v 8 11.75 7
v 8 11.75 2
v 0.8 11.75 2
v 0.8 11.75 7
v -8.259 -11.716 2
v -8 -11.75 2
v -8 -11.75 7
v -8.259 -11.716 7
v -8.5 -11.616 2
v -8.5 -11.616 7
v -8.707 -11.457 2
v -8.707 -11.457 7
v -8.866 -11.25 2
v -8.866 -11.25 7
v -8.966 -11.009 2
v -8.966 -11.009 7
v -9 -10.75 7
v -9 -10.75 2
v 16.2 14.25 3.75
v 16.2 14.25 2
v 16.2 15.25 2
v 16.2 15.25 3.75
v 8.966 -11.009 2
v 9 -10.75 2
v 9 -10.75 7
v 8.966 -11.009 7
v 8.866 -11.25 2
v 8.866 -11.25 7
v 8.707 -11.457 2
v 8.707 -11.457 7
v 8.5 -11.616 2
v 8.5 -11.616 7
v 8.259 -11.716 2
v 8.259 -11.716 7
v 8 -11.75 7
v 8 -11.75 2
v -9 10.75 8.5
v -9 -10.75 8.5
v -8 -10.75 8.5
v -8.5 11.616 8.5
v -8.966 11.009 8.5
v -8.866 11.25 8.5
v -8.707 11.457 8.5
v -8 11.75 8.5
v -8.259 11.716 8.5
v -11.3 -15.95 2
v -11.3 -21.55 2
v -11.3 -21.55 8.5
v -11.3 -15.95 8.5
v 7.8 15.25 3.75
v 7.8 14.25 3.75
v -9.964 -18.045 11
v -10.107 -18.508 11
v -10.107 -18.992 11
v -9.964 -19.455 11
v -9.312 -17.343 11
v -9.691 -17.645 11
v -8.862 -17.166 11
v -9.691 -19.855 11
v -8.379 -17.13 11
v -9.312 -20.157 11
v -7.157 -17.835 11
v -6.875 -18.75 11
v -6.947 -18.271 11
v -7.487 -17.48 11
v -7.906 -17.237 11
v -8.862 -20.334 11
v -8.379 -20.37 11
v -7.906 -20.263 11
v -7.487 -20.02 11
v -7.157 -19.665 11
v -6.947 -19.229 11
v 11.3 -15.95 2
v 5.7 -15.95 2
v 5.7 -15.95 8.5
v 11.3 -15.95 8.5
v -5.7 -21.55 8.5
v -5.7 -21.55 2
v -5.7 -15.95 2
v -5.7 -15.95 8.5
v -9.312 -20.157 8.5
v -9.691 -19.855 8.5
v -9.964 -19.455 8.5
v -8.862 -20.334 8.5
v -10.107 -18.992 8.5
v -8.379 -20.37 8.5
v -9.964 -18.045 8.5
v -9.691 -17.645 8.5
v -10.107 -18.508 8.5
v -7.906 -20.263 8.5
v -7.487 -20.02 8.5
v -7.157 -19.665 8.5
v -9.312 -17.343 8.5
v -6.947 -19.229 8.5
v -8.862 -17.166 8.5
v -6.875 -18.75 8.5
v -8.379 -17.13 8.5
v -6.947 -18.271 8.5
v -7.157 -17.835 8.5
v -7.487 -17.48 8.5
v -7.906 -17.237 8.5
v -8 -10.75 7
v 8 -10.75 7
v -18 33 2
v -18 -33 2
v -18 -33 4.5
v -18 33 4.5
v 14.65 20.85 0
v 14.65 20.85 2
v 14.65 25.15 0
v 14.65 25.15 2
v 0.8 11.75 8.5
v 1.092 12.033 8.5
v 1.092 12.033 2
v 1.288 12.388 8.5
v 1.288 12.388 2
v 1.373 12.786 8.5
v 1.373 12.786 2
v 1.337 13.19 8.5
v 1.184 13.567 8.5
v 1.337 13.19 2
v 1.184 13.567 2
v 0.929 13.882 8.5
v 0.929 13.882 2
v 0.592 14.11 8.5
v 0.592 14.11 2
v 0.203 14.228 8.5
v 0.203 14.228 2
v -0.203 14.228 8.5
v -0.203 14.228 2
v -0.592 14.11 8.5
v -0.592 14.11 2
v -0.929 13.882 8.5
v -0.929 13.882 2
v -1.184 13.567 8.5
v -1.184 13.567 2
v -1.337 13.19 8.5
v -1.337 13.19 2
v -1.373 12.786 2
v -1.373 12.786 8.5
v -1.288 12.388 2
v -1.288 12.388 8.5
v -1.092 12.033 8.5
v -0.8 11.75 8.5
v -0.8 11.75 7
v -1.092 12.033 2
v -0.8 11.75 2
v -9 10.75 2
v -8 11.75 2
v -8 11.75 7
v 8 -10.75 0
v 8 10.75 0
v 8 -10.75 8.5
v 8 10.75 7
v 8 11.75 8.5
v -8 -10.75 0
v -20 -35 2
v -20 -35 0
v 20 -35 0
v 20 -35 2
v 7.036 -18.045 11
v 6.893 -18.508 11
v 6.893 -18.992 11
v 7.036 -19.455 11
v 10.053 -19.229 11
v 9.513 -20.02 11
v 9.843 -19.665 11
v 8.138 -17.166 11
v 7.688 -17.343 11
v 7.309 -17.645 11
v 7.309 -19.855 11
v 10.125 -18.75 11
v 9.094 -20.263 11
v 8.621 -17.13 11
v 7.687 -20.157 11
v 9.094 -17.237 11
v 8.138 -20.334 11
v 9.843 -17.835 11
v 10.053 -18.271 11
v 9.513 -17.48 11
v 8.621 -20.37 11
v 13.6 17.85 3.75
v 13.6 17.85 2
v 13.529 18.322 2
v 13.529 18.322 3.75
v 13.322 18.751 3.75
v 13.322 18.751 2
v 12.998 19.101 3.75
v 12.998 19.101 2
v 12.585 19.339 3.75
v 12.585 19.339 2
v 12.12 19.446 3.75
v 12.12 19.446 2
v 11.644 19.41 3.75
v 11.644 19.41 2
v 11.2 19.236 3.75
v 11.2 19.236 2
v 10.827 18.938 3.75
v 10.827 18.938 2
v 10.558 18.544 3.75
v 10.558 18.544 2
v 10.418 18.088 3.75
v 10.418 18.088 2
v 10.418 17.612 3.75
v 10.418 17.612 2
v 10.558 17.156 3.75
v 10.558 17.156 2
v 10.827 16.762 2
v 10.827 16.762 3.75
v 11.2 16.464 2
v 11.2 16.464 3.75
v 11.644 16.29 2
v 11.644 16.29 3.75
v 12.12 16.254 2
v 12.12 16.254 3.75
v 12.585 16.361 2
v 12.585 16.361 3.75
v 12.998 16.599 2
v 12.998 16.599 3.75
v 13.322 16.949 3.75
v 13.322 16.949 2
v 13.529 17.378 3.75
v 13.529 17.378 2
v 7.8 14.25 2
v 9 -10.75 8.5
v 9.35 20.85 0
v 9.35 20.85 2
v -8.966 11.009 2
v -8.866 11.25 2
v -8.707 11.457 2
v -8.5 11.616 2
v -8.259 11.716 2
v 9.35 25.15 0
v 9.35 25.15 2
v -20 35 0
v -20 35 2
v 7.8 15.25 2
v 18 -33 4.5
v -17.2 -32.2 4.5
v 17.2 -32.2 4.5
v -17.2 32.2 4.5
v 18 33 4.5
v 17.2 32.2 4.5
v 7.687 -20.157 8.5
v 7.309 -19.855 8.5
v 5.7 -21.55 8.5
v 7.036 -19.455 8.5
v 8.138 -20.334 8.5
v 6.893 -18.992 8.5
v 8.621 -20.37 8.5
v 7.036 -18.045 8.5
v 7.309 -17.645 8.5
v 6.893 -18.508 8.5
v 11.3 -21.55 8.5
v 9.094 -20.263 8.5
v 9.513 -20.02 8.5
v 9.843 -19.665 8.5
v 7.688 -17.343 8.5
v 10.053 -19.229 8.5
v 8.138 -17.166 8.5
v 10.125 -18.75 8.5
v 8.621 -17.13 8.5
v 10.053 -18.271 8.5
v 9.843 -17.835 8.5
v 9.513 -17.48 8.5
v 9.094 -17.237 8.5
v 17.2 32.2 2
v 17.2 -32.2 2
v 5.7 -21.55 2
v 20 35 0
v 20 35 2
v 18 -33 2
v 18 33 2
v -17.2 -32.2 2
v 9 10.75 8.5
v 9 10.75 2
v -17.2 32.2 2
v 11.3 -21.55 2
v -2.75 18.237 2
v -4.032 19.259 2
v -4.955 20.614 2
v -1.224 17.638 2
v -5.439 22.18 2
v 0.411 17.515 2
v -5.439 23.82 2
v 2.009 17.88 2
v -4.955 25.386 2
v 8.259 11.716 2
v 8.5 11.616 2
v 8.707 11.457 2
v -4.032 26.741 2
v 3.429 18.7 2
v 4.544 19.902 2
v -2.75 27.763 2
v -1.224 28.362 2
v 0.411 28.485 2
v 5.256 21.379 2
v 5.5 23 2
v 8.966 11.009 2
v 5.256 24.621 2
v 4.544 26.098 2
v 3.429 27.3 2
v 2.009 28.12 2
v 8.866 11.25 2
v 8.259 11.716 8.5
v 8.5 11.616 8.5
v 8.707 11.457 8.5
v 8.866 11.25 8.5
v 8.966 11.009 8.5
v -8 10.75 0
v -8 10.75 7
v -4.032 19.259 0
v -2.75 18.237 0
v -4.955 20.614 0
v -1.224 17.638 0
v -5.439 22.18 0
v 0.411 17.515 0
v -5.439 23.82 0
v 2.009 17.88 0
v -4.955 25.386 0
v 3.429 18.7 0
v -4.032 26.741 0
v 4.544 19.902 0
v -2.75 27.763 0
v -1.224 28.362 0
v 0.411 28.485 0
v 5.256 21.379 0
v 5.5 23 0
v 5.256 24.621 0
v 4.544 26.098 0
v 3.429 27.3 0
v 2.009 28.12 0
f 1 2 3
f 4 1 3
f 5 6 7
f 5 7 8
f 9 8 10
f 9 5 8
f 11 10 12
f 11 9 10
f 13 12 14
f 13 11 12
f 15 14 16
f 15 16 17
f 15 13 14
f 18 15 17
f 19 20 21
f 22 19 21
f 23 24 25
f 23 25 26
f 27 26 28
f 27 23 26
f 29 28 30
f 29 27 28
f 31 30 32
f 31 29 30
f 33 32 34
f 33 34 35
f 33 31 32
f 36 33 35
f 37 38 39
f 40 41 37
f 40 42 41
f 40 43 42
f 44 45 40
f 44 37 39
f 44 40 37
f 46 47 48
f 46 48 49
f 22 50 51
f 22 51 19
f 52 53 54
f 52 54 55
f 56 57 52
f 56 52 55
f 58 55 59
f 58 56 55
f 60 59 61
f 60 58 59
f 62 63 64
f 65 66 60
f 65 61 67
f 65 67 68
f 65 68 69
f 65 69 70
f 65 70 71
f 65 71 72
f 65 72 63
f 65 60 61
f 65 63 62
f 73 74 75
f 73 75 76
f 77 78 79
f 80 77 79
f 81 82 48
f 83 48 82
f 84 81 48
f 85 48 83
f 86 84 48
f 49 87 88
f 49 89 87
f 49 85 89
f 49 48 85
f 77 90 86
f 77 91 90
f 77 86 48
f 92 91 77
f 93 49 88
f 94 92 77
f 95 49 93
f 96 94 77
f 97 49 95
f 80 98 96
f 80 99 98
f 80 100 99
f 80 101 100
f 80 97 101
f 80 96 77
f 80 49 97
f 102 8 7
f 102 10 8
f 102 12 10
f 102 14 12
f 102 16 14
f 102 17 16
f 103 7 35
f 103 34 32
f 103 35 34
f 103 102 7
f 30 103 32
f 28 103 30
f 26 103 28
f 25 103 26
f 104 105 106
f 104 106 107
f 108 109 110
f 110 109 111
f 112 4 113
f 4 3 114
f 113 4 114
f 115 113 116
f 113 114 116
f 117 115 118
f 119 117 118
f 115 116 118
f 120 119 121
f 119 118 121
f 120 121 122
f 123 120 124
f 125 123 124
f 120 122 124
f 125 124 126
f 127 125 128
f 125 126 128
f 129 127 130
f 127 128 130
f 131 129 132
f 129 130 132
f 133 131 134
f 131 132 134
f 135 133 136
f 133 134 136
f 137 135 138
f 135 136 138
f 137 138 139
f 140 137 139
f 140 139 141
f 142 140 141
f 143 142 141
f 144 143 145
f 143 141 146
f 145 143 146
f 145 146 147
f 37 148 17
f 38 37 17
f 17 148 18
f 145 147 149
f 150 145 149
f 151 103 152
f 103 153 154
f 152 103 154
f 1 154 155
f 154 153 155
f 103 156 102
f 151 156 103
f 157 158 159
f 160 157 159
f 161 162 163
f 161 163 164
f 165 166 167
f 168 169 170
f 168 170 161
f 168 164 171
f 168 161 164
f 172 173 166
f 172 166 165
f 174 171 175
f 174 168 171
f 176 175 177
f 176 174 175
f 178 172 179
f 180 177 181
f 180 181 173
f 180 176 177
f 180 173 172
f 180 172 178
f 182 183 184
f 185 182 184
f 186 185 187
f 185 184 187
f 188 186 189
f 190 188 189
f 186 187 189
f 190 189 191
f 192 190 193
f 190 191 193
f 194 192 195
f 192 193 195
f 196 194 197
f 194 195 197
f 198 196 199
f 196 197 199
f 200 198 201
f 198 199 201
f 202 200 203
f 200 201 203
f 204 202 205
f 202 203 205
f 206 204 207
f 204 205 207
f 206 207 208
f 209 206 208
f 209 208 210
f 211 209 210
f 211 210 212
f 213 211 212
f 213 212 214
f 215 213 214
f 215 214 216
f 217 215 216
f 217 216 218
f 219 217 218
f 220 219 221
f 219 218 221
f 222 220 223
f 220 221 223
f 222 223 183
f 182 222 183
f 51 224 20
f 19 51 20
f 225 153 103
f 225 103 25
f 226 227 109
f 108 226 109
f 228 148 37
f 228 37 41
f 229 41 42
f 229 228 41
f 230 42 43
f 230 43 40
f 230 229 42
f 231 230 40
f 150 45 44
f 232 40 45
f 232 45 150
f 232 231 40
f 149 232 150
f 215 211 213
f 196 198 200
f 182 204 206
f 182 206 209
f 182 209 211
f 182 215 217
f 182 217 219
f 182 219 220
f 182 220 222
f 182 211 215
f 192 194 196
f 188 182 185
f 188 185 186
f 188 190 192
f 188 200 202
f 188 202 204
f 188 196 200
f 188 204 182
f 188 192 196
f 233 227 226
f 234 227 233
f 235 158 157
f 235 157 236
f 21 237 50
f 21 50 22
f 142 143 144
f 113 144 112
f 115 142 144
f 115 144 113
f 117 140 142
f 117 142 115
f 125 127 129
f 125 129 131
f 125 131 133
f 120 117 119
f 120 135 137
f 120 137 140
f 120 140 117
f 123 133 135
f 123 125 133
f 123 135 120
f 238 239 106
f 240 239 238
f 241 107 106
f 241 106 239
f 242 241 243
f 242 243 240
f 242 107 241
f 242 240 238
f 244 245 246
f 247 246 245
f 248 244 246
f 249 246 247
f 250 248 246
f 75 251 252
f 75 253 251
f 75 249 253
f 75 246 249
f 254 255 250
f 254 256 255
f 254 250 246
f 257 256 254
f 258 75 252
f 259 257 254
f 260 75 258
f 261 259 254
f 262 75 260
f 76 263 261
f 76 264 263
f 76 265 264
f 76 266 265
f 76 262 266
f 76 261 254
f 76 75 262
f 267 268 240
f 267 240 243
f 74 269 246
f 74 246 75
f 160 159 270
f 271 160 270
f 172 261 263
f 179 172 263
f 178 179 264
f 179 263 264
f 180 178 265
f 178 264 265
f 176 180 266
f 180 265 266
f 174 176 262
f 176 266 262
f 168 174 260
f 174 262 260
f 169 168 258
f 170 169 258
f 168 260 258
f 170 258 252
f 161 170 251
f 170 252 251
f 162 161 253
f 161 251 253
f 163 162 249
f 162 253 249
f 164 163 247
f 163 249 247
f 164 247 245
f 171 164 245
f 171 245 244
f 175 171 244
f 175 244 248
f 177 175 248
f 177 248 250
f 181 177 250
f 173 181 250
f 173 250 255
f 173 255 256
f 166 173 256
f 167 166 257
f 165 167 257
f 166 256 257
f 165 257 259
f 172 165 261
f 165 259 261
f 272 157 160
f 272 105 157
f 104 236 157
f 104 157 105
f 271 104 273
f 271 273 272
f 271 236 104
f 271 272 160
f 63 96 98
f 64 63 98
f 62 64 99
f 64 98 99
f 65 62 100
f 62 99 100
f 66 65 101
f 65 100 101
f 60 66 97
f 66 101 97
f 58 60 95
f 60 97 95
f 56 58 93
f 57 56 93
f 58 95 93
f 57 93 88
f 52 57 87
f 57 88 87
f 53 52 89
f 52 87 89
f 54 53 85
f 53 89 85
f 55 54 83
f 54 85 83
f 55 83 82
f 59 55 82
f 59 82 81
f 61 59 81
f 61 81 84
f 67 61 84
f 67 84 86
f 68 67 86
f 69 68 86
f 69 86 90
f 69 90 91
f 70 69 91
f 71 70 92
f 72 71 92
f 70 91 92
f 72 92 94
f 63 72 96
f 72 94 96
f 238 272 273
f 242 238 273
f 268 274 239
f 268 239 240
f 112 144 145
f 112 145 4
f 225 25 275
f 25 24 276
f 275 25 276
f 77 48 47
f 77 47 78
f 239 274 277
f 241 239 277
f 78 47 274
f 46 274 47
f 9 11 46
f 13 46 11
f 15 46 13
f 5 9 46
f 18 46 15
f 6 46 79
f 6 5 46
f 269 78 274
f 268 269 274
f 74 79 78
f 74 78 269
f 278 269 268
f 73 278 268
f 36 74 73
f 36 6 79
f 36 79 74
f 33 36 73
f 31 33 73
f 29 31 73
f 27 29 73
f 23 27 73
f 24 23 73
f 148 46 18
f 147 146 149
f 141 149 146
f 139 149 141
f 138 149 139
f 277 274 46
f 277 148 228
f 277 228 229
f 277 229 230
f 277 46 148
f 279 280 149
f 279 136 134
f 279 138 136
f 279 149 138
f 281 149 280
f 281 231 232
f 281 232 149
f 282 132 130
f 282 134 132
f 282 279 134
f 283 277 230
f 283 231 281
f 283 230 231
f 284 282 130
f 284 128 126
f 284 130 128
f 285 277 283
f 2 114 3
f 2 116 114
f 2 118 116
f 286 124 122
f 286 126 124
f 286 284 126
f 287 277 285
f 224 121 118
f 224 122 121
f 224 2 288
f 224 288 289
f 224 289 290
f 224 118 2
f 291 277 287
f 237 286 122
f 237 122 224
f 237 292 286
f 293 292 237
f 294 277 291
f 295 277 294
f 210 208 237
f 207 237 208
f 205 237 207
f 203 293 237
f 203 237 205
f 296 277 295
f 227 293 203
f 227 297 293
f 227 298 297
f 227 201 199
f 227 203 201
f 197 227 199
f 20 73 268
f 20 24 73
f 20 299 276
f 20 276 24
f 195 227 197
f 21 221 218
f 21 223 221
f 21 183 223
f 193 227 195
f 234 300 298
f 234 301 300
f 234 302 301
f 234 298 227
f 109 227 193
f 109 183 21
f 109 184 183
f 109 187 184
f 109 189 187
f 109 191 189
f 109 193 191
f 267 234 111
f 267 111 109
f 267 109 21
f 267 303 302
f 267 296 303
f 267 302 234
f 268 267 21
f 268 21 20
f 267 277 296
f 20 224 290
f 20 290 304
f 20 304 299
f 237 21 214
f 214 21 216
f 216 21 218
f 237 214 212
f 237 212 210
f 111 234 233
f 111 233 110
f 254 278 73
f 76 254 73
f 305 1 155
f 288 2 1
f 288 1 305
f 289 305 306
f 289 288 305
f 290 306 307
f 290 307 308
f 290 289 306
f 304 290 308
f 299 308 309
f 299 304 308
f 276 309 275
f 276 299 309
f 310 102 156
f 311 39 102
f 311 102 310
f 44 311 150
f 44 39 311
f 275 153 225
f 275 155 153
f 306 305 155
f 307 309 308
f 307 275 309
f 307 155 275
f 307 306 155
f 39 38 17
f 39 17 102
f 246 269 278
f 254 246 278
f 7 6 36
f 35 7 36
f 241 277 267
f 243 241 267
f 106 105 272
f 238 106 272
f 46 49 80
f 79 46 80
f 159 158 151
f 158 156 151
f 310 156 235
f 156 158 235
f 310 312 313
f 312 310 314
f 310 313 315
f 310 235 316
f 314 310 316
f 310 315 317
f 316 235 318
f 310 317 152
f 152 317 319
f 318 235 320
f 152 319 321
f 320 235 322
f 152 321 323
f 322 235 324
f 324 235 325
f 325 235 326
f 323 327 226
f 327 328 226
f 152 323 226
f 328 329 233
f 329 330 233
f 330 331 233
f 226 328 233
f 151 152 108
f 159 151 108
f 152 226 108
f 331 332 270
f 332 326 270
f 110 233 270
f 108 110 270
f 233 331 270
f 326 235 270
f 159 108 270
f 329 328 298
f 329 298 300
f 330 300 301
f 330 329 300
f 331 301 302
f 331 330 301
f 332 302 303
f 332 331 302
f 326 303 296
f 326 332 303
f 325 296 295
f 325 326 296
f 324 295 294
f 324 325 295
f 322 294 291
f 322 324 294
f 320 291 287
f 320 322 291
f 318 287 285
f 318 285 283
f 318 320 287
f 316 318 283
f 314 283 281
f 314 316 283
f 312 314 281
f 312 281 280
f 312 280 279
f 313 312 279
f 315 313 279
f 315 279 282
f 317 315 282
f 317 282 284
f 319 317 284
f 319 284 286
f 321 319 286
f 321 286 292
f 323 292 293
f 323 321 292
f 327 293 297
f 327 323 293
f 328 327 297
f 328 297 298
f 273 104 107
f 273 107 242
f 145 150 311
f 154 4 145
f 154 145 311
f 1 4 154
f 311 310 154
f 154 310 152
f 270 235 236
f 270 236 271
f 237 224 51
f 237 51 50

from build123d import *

# Parameters (mm, degrees)
SKETCH_W        = 40
SKETCH_H        = 70
SKETCH_R        = 5.5
SKETCH_W_2      = 16
SKETCH_H_2      = 21.5
PAD_DEPTH       = 2
SKETCH001_W     = 5.6
SKETCH001_H     = 5.6
SKETCH001_W_2   = 16
SKETCH001_H_2   = 21.5
PAD001_DEPTH    = 6.5
SKETCH002_R     = 1.625
PAD002_DEPTH    = 2.5
SKETCH003_W     = 16
SKETCH003_H     = 1
SKETCH003_W_2   = 18
POCKET_DEPTH    = 1.5
SKETCH004_W     = 5.3
SKETCH004_H     = 4.3
POCKET001_DEPTH = 2.001
SKETCH005_R     = 1.6
SKETCH005_W     = 8.4
SKETCH005_H     = 1
PAD003_DEPTH    = 1.75
SKETCH006_W     = 36
SKETCH006_H     = 66
SKETCH006_W_2   = 34.4
SKETCH006_H_2   = 64.4
PAD004_DEPTH    = 2.5


with BuildPart() as part:
    # Sketch → Pad (new body)
    with BuildSketch(Plane.XY):
        Rectangle(SKETCH_W, SKETCH_H)
        with Locations((0, 23)):
            Circle(SKETCH_R, mode=Mode.SUBTRACT)
        Rectangle(SKETCH_W_2, SKETCH_H_2, mode=Mode.SUBTRACT)
    extrude(amount=PAD_DEPTH)

    # Sketch001 (on Face11 of Pad) → Pad001 (join)
    with BuildSketch(Plane.XY.offset(2)):
        with Locations((-8.5, -18.75)):
            Rectangle(SKETCH001_W, SKETCH001_H)
        with Locations((8.5, -18.75)):
            Rectangle(SKETCH001_W, SKETCH001_H)
        with BuildLine():
            Line((-8, -11.75), (8, -11.75))
            ThreePointArc((9, -10.75), (8.707107, -11.457107), (8, -11.75))
            Line((9, -10.75), (9, 10.75))
            ThreePointArc((8, 11.75), (8.707107, 11.457107), (9, 10.75))
            Line((8, 11.75), (0.8, 11.75))
            ThreePointArc((0.8, 11.75), (0, 14.243313), (-0.8, 11.75))
            Line((-0.8, 11.75), (-8, 11.75))
            ThreePointArc((-9, 10.75), (-8.707107, 11.457107), (-8, 11.75))
            Line((-9, 10.75), (-9, -10.75))
            ThreePointArc((-8, -11.75), (-8.707107, -11.457107), (-9, -10.75))
        make_face()
        Rectangle(SKETCH001_W_2, SKETCH001_H_2, mode=Mode.SUBTRACT)
    extrude(amount=PAD001_DEPTH)

    # Sketch002 (on Face34 of Pad001) → Pad002 (join)
    with BuildSketch(Plane.XY.offset(8.5)):
        with Locations((-8.5, -18.75)):
            Circle(SKETCH002_R)
        with Locations((8.5, -18.75)):
            Circle(SKETCH002_R)
    extrude(amount=PAD002_DEPTH)

    # Sketch003 (on Face35 of Pad002) → Pocket (cut)
    with BuildSketch(Plane.XY.offset(8.5)):
        with Locations((0, 11.25)):
            Rectangle(SKETCH003_W, SKETCH003_H)
        with Locations((0, -11.25)):
            Rectangle(SKETCH003_W_2, SKETCH003_H)
    extrude(amount=-POCKET_DEPTH, mode=Mode.SUBTRACT)

    # Sketch004 (on Face5 of Pocket) → Pocket001 (cut, through all)
    with BuildSketch(Plane.XY.offset(2)):
        with Locations((12, 23)):
            Rectangle(SKETCH004_W, SKETCH004_H)
    extrude(amount=-POCKET001_DEPTH, mode=Mode.SUBTRACT)

    # Sketch005 (on Face5 of Pocket001) → Pad003 (join)
    with BuildSketch(Plane.XY.offset(2)):
        with Locations((12, 17.85)):
            Circle(SKETCH005_R)
        with Locations((12, 14.75)):
            Rectangle(SKETCH005_W, SKETCH005_H)
    extrude(amount=PAD003_DEPTH)

    # Sketch006 (on Face5 of Pad003) → Pad004 (join)
    with BuildSketch(Plane.XY.offset(2)):
        Rectangle(SKETCH006_W, SKETCH006_H)
        Rectangle(SKETCH006_W_2, SKETCH006_H_2, mode=Mode.SUBTRACT)
    extrude(amount=PAD004_DEPTH)


solid = part.part
